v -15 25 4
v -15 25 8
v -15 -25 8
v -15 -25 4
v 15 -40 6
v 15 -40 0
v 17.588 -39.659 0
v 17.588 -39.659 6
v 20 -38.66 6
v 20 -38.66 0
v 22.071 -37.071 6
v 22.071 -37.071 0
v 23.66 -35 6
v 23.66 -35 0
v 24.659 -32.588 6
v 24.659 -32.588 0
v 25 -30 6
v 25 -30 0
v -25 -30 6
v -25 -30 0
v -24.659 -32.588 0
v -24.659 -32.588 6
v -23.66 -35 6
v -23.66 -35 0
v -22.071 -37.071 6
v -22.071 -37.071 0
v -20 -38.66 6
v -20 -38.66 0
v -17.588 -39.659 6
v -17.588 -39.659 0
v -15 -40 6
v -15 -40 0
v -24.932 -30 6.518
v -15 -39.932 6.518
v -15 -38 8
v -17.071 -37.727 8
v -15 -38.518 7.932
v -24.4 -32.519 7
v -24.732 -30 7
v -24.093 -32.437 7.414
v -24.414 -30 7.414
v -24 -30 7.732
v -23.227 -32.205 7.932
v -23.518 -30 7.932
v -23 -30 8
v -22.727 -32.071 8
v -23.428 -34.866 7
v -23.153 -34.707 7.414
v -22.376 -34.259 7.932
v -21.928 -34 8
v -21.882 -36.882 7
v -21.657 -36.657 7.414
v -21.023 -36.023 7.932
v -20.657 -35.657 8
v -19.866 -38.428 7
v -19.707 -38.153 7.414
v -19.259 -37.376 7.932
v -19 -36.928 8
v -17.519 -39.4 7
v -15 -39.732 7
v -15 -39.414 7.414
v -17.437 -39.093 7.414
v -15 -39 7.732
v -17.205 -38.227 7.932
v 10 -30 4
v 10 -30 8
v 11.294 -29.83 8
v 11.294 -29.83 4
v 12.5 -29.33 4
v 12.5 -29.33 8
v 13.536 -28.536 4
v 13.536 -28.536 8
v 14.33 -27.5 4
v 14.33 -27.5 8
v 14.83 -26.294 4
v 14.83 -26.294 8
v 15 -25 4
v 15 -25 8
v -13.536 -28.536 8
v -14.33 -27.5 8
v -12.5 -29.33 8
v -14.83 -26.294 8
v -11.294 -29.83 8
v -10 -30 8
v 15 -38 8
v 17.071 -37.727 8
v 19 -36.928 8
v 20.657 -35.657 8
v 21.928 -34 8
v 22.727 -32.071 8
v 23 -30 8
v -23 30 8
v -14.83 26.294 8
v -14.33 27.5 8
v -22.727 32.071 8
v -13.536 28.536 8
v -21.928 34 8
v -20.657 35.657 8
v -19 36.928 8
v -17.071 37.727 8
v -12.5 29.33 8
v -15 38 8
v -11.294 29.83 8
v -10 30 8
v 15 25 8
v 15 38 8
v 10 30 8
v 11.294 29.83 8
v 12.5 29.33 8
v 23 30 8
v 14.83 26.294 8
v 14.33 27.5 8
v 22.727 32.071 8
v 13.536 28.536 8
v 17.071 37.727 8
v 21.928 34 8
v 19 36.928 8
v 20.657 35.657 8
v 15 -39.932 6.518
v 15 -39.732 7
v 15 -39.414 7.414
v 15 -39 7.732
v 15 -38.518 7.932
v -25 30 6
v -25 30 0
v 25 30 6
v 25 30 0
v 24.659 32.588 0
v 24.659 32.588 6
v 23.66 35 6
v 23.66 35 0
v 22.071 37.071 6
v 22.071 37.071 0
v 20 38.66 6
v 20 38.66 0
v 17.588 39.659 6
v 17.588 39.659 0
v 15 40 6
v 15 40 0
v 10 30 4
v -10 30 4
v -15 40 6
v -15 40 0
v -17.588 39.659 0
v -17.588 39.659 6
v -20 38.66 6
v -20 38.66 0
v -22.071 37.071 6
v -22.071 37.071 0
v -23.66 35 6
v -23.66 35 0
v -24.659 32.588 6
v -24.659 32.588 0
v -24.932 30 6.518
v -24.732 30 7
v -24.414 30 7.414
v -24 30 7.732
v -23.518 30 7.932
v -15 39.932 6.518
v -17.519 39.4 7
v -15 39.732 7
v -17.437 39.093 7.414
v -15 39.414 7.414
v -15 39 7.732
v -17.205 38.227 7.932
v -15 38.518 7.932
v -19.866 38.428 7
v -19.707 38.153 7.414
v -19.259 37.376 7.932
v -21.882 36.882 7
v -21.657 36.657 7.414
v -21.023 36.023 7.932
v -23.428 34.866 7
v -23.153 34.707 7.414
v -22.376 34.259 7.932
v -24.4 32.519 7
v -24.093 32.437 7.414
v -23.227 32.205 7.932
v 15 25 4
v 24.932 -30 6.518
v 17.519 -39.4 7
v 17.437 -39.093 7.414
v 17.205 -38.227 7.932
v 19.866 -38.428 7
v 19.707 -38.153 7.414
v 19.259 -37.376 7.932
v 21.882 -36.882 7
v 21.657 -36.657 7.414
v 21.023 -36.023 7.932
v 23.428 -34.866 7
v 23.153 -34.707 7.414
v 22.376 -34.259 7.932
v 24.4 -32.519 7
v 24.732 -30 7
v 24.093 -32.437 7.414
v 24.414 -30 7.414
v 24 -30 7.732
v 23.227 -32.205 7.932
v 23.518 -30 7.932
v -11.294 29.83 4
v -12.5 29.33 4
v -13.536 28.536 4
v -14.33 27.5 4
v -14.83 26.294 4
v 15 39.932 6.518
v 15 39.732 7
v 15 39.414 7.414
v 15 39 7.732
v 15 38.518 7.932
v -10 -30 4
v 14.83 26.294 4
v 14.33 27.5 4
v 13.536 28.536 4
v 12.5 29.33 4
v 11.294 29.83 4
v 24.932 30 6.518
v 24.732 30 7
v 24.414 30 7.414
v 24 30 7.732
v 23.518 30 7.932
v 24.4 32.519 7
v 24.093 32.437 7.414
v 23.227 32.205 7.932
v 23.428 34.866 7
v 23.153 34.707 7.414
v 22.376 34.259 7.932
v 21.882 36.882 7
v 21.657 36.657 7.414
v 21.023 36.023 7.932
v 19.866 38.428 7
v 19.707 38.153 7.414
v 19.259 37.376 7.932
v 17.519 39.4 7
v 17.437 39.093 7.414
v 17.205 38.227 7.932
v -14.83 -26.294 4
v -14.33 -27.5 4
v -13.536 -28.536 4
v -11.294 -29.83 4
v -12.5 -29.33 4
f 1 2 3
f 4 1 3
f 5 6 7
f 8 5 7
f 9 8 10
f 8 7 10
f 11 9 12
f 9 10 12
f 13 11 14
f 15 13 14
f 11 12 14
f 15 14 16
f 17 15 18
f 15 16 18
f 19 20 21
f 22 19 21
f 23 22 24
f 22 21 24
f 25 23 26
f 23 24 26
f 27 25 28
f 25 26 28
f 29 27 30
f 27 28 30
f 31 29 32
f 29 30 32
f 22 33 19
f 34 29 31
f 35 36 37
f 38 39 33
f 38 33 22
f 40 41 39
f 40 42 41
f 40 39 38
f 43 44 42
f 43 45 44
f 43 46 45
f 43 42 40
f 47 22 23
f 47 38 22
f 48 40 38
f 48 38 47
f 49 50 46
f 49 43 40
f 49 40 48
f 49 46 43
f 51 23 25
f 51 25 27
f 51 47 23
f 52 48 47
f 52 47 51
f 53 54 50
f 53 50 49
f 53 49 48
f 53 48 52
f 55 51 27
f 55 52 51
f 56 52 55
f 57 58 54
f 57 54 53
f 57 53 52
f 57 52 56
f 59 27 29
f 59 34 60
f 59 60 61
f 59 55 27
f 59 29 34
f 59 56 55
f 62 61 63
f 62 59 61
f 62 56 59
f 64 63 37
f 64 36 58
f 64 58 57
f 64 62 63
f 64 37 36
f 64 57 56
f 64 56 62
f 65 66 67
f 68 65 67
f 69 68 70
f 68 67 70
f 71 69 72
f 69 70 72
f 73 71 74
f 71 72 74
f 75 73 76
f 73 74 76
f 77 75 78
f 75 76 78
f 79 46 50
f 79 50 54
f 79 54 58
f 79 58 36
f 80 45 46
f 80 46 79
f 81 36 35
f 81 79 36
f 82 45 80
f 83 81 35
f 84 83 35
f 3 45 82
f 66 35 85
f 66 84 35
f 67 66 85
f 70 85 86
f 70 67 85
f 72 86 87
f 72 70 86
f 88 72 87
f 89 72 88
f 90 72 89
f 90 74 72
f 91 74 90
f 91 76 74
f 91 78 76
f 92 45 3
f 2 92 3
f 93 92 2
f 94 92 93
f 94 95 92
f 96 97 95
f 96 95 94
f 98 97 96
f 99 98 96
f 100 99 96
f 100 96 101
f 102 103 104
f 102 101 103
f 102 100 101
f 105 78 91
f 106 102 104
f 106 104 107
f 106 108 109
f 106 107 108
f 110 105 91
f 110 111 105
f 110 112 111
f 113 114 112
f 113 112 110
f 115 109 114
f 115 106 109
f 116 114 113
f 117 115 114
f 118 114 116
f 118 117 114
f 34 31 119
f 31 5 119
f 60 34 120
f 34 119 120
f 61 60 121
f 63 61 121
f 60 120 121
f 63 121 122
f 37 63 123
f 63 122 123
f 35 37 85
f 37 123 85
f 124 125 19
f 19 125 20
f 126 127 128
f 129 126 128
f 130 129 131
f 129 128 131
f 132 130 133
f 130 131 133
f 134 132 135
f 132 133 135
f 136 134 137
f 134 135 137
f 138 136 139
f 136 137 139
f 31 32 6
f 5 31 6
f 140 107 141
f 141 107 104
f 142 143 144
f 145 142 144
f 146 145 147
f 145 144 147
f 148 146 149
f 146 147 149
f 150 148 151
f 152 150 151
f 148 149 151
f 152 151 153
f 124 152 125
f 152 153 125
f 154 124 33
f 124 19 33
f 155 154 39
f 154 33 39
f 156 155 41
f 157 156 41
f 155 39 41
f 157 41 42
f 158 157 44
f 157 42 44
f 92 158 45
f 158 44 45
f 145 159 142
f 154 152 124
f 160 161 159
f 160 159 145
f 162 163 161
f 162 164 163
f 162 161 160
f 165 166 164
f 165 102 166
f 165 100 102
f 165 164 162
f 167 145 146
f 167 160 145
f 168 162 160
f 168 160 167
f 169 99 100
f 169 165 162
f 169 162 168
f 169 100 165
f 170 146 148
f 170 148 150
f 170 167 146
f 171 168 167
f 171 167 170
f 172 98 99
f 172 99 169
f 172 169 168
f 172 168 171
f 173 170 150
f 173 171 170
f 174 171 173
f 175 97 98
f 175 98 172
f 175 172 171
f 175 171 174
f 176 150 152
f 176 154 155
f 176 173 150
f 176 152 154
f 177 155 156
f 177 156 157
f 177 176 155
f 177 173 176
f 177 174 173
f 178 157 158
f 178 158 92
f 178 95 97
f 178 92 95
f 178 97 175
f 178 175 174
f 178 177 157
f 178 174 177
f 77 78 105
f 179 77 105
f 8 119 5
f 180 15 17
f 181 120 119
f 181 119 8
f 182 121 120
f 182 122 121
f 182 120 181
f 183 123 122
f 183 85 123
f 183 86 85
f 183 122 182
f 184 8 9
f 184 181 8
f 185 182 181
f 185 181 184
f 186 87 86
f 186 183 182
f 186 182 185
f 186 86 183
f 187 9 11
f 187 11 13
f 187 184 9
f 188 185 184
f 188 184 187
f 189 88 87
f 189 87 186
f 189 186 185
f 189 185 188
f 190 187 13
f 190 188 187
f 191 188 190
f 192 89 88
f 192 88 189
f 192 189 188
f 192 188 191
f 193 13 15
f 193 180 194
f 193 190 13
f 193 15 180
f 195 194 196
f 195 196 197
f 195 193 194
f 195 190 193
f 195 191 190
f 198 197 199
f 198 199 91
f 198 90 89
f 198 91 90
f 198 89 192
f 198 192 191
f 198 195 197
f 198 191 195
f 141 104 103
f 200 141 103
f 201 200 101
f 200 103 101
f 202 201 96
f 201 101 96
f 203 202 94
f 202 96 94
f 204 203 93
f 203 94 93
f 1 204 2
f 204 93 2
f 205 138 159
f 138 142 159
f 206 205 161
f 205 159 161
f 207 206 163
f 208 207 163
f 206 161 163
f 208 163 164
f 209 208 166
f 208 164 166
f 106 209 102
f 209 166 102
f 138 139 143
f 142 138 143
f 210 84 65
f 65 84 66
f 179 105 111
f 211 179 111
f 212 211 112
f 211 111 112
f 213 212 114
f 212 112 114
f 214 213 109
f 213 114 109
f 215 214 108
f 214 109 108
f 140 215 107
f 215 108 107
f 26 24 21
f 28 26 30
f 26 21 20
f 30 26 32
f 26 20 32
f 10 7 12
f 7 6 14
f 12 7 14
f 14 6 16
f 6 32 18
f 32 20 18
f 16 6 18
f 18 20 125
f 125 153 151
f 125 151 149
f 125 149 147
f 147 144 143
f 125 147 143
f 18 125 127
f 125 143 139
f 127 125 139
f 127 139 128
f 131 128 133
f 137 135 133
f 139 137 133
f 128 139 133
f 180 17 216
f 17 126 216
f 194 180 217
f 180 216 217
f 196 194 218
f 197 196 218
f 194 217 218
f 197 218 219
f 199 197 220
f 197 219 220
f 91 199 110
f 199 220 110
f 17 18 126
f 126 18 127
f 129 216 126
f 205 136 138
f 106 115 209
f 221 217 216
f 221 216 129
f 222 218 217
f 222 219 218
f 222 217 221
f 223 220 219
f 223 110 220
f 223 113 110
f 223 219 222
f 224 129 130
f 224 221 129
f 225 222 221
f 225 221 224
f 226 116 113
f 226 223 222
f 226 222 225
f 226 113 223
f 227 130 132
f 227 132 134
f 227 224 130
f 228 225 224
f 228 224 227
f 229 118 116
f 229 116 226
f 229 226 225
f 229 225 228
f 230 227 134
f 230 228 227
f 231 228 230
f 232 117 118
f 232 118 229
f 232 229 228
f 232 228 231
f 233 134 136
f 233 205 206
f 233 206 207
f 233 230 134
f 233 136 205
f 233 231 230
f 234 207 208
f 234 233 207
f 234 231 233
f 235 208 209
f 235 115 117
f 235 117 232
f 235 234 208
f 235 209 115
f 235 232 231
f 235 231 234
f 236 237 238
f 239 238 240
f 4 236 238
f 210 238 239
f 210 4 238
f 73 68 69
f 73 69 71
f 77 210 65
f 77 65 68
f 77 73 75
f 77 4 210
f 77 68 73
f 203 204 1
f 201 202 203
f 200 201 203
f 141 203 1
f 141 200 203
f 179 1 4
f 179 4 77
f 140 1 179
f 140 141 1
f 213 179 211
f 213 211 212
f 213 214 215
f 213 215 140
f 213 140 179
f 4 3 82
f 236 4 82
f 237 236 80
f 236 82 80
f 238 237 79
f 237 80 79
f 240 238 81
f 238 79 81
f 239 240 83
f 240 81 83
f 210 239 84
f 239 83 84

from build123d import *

# Parameters (mm, degrees)
F1_DEPTH = 8
F2_R     = 2
F4_DEPTH = 4


with BuildPart() as f1:
    # F0 (on Top) → F1 (new body)
    with BuildSketch(Plane.XY):
        with BuildLine():
            Line((-15, -40), (15, -40))
            ThreePointArc((15, -40), (22.071068, -37.071068), (25, -30))
            Line((25, -30), (25, 30))
            ThreePointArc((25, 30), (22.071068, 37.071068), (15, 40))
            Line((15, 40), (-15, 40))
            ThreePointArc((-15, 40), (-22.071068, 37.071068), (-25, 30))
            Line((-25, 30), (-25, -30))
            ThreePointArc((-25, -30), (-22.071068, -37.071068), (-15, -40))
        make_face()
    extrude(amount=F1_DEPTH)

    # F2
    f2_edges = [f1.edges().sort_by_distance(p)[0] for p in [
        (0, -40, 8),
        (22.071068, -37.071068, 8),
        (25, 0, 8),
        (22.071068, 37.071068, 8),
        (0, 40, 8),
        (-22.071068, 37.071068, 8),
        (-25, 0, 8),
        (-22.071068, -37.071068, 8),
    ]]
    fillet(f2_edges, radius=F2_R)

    # F3 (on face) → F4 (cut)
    with BuildSketch(Plane.XY.offset(8)):
        with BuildLine():
            Line((-10, -30), (10, -30))
            ThreePointArc((10, -30), (13.535534, -28.535534), (15, -25))
            Line((15, -25), (15, 25))
            ThreePointArc((15, 25), (13.535534, 28.535534), (10, 30))
            Line((10, 30), (-10, 30))
            ThreePointArc((-10, 30), (-13.535534, 28.535534), (-15, 25))
            Line((-15, 25), (-15, -25))
            ThreePointArc((-15, -25), (-13.535534, -28.535534), (-10, -30))
        make_face()
    extrude(amount=-F4_DEPTH, mode=Mode.SUBTRACT)


solid = f1.part
